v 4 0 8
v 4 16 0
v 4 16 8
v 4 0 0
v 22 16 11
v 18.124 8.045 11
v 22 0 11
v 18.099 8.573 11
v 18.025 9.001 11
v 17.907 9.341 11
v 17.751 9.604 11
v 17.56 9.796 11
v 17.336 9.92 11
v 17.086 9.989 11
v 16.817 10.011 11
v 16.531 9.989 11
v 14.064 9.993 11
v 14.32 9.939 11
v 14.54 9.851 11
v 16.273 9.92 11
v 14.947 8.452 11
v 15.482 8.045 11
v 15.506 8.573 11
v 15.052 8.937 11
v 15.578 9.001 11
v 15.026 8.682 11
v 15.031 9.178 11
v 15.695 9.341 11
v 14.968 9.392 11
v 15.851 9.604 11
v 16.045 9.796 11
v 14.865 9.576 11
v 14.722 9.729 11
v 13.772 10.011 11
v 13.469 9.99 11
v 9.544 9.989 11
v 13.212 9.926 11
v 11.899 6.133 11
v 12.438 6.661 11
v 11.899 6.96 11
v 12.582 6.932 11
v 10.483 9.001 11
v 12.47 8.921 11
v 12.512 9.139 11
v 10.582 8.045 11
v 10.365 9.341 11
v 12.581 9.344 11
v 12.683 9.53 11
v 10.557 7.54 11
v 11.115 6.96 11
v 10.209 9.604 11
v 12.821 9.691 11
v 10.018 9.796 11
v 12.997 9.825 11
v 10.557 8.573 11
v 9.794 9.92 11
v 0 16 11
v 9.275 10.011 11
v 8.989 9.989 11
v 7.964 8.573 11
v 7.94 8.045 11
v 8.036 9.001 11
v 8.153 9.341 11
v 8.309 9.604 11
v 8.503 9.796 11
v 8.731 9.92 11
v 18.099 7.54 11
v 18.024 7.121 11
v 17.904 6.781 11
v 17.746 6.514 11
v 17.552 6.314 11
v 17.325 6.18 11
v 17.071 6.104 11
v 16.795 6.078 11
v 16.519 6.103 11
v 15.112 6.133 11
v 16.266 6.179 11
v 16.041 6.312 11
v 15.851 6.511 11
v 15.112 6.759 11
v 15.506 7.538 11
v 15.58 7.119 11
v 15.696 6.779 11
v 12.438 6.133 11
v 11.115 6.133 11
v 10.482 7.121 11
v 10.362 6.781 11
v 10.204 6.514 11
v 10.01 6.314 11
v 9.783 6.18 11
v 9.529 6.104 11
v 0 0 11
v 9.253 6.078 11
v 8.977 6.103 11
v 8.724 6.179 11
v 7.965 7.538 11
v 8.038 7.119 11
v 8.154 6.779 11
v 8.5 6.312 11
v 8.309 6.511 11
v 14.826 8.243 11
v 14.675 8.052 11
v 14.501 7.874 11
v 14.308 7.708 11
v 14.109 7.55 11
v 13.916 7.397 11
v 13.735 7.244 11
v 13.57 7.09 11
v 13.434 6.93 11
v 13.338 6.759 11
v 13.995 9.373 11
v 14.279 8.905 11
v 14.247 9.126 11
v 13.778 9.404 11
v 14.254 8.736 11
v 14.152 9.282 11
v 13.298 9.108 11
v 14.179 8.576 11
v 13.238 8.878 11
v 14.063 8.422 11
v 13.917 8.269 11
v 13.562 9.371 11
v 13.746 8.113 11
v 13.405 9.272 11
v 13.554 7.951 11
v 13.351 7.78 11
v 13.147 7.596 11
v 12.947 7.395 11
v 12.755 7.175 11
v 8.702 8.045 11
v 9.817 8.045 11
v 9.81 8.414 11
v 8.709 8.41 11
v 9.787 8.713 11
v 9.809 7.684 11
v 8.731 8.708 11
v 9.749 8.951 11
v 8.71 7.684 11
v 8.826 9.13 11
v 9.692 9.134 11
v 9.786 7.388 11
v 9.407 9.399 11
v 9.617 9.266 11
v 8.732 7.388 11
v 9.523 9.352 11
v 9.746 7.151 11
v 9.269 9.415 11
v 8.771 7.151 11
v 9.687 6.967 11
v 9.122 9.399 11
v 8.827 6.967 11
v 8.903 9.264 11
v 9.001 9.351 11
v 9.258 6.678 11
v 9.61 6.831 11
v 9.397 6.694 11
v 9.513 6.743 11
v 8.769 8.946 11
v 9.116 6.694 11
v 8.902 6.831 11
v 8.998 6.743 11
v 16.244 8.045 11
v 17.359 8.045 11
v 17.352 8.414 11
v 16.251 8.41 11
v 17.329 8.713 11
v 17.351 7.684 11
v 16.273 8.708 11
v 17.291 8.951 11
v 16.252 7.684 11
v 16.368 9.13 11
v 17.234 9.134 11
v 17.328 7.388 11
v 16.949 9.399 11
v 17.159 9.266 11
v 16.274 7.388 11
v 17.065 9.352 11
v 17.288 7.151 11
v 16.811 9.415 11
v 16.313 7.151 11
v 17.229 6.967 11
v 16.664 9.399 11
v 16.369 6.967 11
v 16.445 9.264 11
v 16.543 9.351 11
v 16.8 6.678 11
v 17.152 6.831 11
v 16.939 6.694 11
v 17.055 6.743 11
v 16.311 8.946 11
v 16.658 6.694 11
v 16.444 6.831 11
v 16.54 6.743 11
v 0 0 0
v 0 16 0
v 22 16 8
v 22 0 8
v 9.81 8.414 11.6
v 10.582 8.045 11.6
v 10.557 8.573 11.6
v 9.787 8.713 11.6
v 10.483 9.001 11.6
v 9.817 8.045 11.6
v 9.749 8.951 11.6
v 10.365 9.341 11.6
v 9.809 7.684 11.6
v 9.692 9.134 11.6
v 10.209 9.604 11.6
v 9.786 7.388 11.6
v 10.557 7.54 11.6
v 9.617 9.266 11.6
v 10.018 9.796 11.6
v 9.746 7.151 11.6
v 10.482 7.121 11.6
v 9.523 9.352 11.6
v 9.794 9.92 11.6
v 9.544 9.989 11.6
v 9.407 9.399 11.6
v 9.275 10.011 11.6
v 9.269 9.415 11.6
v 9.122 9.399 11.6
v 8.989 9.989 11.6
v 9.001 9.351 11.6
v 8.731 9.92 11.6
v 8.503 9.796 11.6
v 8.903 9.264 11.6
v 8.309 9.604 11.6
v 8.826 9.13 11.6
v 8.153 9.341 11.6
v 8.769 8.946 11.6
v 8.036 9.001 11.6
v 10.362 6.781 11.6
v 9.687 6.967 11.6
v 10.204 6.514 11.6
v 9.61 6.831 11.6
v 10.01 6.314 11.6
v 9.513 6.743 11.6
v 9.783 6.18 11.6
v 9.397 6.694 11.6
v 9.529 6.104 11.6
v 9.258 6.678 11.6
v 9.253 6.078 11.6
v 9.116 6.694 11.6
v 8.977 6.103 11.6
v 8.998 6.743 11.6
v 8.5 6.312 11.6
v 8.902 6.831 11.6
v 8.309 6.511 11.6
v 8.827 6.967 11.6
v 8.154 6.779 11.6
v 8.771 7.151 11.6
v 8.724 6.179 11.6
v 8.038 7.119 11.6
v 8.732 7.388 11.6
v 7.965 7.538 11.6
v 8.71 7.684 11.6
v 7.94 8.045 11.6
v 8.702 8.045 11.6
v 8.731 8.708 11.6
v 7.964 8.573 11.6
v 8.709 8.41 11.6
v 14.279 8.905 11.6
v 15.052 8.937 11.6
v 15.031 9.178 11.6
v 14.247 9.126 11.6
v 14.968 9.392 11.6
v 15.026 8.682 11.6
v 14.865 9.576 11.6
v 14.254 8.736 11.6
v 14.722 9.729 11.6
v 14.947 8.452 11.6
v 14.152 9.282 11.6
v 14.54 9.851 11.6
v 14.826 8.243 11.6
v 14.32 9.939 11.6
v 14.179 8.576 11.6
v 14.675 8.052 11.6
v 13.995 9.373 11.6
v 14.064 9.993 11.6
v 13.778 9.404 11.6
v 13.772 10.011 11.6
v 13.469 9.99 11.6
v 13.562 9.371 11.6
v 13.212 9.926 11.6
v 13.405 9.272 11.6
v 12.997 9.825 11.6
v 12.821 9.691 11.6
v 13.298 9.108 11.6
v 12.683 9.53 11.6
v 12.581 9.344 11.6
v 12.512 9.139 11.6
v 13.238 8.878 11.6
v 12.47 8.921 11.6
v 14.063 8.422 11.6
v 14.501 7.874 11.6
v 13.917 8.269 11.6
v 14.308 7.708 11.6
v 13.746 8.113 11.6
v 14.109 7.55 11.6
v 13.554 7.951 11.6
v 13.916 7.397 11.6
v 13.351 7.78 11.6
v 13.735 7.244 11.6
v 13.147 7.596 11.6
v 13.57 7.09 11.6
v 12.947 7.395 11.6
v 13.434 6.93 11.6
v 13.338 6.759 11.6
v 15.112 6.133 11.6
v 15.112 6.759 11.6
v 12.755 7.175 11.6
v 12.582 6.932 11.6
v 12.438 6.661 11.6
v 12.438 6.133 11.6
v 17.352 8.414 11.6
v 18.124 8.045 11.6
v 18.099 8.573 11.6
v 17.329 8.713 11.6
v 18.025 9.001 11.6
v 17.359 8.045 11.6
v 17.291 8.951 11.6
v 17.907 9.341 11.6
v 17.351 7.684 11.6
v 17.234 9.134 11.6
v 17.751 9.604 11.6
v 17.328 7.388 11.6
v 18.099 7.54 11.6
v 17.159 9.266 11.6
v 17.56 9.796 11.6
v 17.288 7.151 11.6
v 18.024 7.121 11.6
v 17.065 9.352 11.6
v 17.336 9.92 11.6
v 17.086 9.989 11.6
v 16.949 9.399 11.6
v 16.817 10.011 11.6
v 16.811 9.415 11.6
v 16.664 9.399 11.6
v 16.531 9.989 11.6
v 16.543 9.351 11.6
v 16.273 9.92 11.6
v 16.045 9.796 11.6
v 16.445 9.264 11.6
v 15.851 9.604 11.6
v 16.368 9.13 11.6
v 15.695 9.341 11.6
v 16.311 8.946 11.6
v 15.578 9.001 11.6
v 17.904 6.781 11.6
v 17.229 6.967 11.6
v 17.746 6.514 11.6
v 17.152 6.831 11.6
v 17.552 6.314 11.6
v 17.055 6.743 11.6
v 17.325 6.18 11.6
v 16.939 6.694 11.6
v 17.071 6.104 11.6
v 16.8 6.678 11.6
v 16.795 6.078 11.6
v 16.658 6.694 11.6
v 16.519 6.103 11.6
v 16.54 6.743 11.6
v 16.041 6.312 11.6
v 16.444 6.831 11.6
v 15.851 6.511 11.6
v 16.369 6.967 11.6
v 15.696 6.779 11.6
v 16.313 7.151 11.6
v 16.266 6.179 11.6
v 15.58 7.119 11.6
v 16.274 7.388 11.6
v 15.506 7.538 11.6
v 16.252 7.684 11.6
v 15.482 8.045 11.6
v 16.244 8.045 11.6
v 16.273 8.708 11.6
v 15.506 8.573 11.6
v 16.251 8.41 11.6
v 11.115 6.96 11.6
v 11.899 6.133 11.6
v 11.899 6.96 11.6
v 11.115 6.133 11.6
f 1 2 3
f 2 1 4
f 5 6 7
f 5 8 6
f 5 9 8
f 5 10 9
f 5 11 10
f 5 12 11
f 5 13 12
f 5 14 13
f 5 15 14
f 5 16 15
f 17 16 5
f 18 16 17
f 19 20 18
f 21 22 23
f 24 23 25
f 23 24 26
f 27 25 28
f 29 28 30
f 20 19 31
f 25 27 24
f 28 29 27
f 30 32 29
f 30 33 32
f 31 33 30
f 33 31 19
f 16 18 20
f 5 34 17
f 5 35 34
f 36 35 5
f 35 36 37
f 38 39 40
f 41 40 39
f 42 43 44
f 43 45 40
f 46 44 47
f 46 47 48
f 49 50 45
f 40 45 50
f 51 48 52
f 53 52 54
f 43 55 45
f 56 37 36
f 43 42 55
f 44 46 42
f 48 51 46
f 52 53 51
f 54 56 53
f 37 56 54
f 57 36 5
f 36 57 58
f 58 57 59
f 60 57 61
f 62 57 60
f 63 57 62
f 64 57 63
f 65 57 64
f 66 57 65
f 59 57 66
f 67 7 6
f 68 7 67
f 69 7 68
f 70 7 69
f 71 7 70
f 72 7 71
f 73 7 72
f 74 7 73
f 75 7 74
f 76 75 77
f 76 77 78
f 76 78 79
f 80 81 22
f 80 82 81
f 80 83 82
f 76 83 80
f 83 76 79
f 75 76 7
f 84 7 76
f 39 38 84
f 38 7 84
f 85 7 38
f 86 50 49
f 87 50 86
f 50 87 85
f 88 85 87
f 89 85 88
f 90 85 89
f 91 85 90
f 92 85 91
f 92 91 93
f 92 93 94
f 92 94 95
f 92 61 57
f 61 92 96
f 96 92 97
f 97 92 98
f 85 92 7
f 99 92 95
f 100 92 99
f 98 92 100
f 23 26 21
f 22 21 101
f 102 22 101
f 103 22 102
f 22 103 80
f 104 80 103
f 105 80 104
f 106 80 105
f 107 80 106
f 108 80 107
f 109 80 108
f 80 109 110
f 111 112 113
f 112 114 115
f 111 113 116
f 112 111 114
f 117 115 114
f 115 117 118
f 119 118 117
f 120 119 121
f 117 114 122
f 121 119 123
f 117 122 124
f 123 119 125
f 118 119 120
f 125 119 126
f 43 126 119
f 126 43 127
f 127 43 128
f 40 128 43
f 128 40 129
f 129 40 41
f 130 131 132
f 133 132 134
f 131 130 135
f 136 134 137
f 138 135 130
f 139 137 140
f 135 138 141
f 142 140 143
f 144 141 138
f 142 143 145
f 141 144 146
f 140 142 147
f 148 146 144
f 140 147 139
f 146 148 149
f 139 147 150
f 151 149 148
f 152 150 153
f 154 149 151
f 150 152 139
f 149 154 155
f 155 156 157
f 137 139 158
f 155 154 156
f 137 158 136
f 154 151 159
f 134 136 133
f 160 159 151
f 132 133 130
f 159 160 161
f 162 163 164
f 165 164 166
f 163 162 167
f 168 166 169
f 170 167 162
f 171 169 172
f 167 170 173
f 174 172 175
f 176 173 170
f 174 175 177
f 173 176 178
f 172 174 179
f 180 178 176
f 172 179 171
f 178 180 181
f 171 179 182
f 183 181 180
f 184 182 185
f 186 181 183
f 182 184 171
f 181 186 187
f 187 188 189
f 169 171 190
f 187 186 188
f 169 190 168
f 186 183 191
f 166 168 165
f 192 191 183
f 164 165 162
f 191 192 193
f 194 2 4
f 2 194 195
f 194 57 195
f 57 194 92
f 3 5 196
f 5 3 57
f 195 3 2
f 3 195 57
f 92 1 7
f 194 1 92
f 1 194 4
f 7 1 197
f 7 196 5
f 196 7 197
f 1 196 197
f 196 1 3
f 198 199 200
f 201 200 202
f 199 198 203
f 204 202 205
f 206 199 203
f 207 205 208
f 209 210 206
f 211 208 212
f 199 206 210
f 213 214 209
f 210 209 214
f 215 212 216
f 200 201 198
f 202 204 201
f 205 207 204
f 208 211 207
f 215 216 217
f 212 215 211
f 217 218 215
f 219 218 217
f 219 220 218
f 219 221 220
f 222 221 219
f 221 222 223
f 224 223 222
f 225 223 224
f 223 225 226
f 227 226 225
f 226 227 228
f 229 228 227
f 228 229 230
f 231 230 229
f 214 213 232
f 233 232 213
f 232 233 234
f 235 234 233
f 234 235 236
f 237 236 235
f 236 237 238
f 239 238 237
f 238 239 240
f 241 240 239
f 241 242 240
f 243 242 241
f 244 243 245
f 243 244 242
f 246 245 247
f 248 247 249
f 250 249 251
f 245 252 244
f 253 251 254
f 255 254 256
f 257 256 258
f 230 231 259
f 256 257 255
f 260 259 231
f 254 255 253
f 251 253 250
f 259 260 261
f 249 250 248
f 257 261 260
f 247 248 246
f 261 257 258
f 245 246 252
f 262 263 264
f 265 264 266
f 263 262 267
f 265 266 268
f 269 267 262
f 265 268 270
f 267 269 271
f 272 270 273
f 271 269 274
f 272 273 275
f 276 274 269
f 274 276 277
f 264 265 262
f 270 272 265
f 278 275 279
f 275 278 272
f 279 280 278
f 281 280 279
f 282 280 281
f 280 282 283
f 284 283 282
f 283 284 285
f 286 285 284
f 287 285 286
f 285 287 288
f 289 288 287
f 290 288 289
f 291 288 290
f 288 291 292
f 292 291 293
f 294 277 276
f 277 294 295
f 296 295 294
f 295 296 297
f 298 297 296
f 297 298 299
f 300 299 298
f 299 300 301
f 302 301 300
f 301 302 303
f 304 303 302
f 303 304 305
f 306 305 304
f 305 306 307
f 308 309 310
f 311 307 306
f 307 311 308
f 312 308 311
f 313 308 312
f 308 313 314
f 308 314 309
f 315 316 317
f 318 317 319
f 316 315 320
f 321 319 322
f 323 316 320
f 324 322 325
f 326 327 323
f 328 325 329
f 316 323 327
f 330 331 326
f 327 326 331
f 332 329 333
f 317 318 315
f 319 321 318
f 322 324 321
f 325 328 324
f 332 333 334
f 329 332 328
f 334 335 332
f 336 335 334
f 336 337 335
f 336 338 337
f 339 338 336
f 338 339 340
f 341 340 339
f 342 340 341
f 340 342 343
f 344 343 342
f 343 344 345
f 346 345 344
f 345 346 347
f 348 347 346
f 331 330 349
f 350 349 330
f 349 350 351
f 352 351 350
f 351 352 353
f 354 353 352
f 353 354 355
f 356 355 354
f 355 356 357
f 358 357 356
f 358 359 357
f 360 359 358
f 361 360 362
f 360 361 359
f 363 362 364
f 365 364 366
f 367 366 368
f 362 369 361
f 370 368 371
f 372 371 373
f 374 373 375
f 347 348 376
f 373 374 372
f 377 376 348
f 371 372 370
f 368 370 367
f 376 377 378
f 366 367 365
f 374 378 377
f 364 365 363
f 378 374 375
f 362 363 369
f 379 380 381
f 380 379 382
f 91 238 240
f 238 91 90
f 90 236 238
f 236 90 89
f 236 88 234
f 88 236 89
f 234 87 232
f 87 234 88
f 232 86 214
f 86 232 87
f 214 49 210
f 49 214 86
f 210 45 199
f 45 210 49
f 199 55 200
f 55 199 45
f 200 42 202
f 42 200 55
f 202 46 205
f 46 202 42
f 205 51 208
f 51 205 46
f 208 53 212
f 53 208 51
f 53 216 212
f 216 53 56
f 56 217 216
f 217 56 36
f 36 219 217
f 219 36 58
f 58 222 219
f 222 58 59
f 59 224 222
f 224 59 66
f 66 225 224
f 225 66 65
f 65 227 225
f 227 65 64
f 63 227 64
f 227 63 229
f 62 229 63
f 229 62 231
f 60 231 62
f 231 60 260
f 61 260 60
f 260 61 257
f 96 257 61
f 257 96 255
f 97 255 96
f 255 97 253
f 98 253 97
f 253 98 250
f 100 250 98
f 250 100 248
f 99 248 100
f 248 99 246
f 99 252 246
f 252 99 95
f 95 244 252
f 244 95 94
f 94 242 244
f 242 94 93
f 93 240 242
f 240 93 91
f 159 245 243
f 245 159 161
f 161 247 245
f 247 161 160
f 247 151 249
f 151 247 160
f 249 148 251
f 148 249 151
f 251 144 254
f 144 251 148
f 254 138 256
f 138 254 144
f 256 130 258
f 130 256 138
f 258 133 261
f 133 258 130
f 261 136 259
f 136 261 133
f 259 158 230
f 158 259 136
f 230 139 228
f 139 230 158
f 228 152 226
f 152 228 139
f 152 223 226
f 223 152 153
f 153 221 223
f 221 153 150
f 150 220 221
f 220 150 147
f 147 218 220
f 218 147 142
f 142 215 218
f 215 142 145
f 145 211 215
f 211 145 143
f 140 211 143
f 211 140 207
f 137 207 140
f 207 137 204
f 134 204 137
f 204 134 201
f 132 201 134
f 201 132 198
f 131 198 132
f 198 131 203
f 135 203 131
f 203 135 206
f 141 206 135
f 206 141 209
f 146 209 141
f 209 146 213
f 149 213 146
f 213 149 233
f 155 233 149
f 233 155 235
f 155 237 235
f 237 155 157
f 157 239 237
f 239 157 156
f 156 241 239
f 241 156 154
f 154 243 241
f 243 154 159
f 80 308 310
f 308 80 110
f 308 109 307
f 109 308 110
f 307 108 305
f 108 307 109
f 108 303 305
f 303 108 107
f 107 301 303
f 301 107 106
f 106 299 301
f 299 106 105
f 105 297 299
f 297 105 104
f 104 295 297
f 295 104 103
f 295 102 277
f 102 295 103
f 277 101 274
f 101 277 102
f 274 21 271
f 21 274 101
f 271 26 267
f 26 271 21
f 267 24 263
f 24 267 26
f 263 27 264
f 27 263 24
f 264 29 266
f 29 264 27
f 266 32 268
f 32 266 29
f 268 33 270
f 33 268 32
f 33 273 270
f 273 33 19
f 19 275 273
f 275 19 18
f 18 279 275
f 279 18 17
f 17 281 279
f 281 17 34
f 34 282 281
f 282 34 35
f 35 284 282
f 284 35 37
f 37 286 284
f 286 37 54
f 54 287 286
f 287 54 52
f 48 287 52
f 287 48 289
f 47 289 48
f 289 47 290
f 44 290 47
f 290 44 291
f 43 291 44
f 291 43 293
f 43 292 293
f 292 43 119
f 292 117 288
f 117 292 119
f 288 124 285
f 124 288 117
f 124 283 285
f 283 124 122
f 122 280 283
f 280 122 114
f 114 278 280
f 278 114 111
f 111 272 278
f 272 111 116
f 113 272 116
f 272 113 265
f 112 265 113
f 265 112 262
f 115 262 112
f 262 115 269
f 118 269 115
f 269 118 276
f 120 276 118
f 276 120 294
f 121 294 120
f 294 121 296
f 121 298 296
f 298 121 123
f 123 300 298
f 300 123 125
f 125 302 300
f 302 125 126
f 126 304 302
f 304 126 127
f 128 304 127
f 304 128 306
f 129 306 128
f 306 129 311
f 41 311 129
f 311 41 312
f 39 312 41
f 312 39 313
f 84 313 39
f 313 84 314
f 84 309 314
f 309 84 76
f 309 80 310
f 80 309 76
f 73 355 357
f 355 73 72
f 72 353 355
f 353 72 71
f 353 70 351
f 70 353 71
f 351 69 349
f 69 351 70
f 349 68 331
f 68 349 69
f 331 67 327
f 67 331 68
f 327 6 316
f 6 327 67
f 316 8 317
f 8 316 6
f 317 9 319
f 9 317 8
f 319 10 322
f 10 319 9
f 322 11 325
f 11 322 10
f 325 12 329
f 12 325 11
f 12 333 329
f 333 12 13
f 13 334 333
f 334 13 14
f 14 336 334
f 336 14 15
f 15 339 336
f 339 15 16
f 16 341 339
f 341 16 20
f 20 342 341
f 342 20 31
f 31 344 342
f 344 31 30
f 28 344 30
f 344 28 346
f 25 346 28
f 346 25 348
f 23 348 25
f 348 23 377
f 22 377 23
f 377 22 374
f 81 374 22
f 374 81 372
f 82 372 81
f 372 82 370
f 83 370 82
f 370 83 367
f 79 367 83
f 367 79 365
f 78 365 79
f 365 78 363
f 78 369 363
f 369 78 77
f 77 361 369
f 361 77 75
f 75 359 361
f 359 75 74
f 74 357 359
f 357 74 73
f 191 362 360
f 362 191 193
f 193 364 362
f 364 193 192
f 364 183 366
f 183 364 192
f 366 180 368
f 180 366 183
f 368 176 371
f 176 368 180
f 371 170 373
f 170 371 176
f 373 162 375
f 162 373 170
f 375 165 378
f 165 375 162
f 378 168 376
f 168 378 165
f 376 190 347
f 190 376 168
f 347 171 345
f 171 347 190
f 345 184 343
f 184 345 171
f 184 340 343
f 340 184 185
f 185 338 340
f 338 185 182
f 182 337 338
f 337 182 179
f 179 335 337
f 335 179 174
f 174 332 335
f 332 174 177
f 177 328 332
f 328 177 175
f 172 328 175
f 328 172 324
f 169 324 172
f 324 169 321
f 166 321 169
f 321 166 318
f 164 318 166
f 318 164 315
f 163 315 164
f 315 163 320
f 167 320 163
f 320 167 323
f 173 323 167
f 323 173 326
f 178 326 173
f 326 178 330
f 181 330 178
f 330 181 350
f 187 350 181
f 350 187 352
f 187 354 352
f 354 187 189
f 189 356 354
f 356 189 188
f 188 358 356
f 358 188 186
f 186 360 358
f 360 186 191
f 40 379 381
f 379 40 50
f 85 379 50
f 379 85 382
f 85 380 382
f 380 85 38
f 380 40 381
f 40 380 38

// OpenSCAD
// Support gap specimen: a 4-mm post with an 18-mm shelf cantilevered at z = 8, the gap value raised on the shelf top.
// The shelf underside is the only overhang, so the tree under it is the only support on the part.
label = "0.20";

post = [4, 16];          // x, y
shelf = [18, 16, 3];     // overhang length (x), width (y), thickness
under = 8;               // shelf underside above the bed

cube([post[0], post[1], under + shelf[2]]);
translate([post[0], 0, under]) cube(shelf);
translate([post[0] + shelf[0] / 2, post[1] / 2, under + shelf[2]])
    linear_extrude(0.6) text(label, size = 4, font = "Liberation Sans:style=Bold", halign = "center", valign = "center");
